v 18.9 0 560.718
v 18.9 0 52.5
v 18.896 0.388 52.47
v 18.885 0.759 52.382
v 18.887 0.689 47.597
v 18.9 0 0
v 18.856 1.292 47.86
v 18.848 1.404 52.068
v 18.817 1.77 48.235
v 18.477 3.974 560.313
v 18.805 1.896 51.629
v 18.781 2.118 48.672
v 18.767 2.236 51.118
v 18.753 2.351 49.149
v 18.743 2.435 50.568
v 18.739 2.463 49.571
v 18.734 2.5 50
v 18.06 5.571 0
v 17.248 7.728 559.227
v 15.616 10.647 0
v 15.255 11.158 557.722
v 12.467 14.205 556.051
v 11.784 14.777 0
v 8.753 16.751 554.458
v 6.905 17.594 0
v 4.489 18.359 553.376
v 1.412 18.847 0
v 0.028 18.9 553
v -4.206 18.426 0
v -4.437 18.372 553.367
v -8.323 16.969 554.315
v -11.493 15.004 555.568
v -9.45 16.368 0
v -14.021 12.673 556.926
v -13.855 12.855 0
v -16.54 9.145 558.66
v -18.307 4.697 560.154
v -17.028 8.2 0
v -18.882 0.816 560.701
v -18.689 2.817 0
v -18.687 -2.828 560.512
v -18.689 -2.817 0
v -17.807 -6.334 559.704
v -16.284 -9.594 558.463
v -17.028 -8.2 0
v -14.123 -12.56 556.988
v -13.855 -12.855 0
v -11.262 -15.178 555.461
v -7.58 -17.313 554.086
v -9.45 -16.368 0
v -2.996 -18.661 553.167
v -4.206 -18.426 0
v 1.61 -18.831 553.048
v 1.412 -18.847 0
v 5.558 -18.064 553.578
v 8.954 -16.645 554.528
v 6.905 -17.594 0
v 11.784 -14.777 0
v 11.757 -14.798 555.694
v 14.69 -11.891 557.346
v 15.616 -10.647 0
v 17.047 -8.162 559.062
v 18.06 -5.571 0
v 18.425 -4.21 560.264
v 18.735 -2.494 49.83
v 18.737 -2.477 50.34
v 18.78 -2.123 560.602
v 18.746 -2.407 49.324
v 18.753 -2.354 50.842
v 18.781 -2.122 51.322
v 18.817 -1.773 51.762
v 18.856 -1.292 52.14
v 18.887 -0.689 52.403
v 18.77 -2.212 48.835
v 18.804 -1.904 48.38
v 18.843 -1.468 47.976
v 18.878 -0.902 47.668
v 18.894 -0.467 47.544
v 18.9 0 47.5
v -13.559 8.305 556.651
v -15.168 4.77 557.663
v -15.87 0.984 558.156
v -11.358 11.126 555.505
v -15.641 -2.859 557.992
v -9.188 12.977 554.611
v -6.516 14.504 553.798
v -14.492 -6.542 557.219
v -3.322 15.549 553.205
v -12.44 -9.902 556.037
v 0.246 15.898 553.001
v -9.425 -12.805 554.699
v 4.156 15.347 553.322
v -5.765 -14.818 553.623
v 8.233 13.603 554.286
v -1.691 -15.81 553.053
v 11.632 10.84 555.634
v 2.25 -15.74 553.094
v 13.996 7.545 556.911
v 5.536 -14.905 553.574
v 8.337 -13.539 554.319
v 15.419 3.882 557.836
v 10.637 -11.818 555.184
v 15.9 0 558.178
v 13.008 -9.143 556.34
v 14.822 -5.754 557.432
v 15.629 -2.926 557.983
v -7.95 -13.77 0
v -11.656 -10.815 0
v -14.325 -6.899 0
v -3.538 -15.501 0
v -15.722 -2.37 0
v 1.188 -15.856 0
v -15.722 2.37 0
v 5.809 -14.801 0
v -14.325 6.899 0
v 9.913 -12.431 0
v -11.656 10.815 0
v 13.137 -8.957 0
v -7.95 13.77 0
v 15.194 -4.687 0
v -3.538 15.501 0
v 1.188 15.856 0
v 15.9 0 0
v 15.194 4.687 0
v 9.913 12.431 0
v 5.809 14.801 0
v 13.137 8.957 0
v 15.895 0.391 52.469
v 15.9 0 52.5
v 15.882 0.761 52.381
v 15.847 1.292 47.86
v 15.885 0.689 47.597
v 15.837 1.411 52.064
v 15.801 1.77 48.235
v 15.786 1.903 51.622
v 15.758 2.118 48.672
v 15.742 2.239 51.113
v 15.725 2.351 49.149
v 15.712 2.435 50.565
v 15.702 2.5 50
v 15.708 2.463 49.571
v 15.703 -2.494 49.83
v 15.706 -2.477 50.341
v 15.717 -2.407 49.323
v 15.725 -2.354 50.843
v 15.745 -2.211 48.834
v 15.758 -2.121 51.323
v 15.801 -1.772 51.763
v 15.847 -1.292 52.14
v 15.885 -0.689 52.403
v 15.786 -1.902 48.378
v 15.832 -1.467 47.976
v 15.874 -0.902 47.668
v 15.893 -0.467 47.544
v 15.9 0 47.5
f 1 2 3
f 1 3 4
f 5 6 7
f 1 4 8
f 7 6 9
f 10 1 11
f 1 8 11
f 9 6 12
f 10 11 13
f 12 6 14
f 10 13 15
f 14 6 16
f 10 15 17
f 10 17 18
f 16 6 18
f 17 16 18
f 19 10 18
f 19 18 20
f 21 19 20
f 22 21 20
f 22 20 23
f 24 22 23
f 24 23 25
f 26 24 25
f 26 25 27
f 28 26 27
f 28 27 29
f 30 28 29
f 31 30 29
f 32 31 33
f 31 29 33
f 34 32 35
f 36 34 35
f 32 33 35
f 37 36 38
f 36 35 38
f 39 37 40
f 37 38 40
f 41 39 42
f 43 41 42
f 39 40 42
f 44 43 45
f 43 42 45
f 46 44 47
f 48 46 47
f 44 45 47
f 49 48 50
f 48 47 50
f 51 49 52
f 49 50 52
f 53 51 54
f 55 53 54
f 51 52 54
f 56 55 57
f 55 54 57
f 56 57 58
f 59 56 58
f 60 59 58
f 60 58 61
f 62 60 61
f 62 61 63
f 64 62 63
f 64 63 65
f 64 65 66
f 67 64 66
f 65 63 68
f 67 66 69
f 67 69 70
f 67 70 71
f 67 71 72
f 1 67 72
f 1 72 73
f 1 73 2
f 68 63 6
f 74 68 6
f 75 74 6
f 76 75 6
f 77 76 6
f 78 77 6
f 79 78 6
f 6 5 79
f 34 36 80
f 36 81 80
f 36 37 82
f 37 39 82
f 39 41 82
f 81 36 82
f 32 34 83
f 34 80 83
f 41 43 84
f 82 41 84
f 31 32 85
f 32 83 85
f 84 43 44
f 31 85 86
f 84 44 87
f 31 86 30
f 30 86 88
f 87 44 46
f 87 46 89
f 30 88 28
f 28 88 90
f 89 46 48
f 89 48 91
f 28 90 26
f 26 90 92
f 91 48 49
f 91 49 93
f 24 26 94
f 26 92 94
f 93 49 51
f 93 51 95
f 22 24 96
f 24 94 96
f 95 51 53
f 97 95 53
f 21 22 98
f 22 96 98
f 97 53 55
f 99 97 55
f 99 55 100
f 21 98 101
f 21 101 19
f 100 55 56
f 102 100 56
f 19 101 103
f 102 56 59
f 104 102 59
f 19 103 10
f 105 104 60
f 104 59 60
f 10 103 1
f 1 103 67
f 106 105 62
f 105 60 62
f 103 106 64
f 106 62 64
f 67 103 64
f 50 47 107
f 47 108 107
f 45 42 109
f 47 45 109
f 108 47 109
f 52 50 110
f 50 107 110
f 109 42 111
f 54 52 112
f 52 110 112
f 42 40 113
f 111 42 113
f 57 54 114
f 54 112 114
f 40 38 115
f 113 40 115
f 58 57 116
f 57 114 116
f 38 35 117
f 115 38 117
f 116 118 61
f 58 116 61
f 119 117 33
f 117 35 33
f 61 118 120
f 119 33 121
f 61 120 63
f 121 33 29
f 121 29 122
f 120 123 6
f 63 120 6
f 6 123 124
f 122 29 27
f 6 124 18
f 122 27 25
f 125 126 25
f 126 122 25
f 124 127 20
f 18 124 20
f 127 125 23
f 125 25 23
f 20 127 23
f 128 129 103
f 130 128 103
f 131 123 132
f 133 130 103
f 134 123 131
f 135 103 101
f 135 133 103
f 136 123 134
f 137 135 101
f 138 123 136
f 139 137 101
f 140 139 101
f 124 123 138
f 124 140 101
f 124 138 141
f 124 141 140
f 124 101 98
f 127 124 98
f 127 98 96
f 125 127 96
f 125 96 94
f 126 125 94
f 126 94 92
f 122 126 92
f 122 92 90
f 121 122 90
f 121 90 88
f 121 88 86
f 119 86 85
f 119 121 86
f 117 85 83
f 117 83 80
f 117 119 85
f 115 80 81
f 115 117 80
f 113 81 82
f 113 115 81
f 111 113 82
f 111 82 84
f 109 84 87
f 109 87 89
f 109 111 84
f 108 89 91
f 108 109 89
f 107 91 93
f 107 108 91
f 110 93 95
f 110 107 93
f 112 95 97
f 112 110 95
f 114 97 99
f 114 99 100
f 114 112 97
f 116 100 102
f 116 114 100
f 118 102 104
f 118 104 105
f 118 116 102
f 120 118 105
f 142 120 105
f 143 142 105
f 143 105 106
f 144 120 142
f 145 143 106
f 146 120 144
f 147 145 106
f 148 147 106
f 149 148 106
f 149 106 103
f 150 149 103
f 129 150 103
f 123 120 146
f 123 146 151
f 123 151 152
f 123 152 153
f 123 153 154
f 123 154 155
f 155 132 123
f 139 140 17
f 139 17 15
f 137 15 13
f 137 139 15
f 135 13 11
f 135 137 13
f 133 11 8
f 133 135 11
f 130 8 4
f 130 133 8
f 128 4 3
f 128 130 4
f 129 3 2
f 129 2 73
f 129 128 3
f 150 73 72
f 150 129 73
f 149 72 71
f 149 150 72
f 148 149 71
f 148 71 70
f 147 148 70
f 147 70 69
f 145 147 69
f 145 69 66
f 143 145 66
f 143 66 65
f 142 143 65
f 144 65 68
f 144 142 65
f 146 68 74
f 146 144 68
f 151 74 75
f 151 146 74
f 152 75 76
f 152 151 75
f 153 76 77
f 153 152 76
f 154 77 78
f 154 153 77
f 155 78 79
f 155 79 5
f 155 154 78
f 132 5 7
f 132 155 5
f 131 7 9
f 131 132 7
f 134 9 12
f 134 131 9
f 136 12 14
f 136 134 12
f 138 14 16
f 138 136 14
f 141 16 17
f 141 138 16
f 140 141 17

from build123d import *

# Parameters (mm, degrees)
F0_R     = 18.9
F0_R_2   = 15.9
F1_DEPTH = 580
F5_R     = 27
F6_DEPTH = 50
F7_R     = 2.5
F8_DEPTH = 18.901


with BuildPart() as f1:
    # F0 (on Top) → F1 (new body)
    with BuildSketch(Plane.XY):
        Circle(F0_R)
        Circle(F0_R_2, mode=Mode.SUBTRACT)
    extrude(amount=F1_DEPTH)

    # F5 (on face) → F6 (cut, symmetric)
    with BuildSketch(Plane.XZ):
        with Locations((0, 580)):
            Circle(F5_R)
    extrude(amount=F6_DEPTH, both=True, mode=Mode.SUBTRACT)

    # F7 (on Right) → F8 (cut, through all)
    with BuildSketch(Plane.YZ):
        with Locations((0, 50)):
            Circle(F7_R)
    extrude(amount=F8_DEPTH, mode=Mode.SUBTRACT)


solid = f1.part
